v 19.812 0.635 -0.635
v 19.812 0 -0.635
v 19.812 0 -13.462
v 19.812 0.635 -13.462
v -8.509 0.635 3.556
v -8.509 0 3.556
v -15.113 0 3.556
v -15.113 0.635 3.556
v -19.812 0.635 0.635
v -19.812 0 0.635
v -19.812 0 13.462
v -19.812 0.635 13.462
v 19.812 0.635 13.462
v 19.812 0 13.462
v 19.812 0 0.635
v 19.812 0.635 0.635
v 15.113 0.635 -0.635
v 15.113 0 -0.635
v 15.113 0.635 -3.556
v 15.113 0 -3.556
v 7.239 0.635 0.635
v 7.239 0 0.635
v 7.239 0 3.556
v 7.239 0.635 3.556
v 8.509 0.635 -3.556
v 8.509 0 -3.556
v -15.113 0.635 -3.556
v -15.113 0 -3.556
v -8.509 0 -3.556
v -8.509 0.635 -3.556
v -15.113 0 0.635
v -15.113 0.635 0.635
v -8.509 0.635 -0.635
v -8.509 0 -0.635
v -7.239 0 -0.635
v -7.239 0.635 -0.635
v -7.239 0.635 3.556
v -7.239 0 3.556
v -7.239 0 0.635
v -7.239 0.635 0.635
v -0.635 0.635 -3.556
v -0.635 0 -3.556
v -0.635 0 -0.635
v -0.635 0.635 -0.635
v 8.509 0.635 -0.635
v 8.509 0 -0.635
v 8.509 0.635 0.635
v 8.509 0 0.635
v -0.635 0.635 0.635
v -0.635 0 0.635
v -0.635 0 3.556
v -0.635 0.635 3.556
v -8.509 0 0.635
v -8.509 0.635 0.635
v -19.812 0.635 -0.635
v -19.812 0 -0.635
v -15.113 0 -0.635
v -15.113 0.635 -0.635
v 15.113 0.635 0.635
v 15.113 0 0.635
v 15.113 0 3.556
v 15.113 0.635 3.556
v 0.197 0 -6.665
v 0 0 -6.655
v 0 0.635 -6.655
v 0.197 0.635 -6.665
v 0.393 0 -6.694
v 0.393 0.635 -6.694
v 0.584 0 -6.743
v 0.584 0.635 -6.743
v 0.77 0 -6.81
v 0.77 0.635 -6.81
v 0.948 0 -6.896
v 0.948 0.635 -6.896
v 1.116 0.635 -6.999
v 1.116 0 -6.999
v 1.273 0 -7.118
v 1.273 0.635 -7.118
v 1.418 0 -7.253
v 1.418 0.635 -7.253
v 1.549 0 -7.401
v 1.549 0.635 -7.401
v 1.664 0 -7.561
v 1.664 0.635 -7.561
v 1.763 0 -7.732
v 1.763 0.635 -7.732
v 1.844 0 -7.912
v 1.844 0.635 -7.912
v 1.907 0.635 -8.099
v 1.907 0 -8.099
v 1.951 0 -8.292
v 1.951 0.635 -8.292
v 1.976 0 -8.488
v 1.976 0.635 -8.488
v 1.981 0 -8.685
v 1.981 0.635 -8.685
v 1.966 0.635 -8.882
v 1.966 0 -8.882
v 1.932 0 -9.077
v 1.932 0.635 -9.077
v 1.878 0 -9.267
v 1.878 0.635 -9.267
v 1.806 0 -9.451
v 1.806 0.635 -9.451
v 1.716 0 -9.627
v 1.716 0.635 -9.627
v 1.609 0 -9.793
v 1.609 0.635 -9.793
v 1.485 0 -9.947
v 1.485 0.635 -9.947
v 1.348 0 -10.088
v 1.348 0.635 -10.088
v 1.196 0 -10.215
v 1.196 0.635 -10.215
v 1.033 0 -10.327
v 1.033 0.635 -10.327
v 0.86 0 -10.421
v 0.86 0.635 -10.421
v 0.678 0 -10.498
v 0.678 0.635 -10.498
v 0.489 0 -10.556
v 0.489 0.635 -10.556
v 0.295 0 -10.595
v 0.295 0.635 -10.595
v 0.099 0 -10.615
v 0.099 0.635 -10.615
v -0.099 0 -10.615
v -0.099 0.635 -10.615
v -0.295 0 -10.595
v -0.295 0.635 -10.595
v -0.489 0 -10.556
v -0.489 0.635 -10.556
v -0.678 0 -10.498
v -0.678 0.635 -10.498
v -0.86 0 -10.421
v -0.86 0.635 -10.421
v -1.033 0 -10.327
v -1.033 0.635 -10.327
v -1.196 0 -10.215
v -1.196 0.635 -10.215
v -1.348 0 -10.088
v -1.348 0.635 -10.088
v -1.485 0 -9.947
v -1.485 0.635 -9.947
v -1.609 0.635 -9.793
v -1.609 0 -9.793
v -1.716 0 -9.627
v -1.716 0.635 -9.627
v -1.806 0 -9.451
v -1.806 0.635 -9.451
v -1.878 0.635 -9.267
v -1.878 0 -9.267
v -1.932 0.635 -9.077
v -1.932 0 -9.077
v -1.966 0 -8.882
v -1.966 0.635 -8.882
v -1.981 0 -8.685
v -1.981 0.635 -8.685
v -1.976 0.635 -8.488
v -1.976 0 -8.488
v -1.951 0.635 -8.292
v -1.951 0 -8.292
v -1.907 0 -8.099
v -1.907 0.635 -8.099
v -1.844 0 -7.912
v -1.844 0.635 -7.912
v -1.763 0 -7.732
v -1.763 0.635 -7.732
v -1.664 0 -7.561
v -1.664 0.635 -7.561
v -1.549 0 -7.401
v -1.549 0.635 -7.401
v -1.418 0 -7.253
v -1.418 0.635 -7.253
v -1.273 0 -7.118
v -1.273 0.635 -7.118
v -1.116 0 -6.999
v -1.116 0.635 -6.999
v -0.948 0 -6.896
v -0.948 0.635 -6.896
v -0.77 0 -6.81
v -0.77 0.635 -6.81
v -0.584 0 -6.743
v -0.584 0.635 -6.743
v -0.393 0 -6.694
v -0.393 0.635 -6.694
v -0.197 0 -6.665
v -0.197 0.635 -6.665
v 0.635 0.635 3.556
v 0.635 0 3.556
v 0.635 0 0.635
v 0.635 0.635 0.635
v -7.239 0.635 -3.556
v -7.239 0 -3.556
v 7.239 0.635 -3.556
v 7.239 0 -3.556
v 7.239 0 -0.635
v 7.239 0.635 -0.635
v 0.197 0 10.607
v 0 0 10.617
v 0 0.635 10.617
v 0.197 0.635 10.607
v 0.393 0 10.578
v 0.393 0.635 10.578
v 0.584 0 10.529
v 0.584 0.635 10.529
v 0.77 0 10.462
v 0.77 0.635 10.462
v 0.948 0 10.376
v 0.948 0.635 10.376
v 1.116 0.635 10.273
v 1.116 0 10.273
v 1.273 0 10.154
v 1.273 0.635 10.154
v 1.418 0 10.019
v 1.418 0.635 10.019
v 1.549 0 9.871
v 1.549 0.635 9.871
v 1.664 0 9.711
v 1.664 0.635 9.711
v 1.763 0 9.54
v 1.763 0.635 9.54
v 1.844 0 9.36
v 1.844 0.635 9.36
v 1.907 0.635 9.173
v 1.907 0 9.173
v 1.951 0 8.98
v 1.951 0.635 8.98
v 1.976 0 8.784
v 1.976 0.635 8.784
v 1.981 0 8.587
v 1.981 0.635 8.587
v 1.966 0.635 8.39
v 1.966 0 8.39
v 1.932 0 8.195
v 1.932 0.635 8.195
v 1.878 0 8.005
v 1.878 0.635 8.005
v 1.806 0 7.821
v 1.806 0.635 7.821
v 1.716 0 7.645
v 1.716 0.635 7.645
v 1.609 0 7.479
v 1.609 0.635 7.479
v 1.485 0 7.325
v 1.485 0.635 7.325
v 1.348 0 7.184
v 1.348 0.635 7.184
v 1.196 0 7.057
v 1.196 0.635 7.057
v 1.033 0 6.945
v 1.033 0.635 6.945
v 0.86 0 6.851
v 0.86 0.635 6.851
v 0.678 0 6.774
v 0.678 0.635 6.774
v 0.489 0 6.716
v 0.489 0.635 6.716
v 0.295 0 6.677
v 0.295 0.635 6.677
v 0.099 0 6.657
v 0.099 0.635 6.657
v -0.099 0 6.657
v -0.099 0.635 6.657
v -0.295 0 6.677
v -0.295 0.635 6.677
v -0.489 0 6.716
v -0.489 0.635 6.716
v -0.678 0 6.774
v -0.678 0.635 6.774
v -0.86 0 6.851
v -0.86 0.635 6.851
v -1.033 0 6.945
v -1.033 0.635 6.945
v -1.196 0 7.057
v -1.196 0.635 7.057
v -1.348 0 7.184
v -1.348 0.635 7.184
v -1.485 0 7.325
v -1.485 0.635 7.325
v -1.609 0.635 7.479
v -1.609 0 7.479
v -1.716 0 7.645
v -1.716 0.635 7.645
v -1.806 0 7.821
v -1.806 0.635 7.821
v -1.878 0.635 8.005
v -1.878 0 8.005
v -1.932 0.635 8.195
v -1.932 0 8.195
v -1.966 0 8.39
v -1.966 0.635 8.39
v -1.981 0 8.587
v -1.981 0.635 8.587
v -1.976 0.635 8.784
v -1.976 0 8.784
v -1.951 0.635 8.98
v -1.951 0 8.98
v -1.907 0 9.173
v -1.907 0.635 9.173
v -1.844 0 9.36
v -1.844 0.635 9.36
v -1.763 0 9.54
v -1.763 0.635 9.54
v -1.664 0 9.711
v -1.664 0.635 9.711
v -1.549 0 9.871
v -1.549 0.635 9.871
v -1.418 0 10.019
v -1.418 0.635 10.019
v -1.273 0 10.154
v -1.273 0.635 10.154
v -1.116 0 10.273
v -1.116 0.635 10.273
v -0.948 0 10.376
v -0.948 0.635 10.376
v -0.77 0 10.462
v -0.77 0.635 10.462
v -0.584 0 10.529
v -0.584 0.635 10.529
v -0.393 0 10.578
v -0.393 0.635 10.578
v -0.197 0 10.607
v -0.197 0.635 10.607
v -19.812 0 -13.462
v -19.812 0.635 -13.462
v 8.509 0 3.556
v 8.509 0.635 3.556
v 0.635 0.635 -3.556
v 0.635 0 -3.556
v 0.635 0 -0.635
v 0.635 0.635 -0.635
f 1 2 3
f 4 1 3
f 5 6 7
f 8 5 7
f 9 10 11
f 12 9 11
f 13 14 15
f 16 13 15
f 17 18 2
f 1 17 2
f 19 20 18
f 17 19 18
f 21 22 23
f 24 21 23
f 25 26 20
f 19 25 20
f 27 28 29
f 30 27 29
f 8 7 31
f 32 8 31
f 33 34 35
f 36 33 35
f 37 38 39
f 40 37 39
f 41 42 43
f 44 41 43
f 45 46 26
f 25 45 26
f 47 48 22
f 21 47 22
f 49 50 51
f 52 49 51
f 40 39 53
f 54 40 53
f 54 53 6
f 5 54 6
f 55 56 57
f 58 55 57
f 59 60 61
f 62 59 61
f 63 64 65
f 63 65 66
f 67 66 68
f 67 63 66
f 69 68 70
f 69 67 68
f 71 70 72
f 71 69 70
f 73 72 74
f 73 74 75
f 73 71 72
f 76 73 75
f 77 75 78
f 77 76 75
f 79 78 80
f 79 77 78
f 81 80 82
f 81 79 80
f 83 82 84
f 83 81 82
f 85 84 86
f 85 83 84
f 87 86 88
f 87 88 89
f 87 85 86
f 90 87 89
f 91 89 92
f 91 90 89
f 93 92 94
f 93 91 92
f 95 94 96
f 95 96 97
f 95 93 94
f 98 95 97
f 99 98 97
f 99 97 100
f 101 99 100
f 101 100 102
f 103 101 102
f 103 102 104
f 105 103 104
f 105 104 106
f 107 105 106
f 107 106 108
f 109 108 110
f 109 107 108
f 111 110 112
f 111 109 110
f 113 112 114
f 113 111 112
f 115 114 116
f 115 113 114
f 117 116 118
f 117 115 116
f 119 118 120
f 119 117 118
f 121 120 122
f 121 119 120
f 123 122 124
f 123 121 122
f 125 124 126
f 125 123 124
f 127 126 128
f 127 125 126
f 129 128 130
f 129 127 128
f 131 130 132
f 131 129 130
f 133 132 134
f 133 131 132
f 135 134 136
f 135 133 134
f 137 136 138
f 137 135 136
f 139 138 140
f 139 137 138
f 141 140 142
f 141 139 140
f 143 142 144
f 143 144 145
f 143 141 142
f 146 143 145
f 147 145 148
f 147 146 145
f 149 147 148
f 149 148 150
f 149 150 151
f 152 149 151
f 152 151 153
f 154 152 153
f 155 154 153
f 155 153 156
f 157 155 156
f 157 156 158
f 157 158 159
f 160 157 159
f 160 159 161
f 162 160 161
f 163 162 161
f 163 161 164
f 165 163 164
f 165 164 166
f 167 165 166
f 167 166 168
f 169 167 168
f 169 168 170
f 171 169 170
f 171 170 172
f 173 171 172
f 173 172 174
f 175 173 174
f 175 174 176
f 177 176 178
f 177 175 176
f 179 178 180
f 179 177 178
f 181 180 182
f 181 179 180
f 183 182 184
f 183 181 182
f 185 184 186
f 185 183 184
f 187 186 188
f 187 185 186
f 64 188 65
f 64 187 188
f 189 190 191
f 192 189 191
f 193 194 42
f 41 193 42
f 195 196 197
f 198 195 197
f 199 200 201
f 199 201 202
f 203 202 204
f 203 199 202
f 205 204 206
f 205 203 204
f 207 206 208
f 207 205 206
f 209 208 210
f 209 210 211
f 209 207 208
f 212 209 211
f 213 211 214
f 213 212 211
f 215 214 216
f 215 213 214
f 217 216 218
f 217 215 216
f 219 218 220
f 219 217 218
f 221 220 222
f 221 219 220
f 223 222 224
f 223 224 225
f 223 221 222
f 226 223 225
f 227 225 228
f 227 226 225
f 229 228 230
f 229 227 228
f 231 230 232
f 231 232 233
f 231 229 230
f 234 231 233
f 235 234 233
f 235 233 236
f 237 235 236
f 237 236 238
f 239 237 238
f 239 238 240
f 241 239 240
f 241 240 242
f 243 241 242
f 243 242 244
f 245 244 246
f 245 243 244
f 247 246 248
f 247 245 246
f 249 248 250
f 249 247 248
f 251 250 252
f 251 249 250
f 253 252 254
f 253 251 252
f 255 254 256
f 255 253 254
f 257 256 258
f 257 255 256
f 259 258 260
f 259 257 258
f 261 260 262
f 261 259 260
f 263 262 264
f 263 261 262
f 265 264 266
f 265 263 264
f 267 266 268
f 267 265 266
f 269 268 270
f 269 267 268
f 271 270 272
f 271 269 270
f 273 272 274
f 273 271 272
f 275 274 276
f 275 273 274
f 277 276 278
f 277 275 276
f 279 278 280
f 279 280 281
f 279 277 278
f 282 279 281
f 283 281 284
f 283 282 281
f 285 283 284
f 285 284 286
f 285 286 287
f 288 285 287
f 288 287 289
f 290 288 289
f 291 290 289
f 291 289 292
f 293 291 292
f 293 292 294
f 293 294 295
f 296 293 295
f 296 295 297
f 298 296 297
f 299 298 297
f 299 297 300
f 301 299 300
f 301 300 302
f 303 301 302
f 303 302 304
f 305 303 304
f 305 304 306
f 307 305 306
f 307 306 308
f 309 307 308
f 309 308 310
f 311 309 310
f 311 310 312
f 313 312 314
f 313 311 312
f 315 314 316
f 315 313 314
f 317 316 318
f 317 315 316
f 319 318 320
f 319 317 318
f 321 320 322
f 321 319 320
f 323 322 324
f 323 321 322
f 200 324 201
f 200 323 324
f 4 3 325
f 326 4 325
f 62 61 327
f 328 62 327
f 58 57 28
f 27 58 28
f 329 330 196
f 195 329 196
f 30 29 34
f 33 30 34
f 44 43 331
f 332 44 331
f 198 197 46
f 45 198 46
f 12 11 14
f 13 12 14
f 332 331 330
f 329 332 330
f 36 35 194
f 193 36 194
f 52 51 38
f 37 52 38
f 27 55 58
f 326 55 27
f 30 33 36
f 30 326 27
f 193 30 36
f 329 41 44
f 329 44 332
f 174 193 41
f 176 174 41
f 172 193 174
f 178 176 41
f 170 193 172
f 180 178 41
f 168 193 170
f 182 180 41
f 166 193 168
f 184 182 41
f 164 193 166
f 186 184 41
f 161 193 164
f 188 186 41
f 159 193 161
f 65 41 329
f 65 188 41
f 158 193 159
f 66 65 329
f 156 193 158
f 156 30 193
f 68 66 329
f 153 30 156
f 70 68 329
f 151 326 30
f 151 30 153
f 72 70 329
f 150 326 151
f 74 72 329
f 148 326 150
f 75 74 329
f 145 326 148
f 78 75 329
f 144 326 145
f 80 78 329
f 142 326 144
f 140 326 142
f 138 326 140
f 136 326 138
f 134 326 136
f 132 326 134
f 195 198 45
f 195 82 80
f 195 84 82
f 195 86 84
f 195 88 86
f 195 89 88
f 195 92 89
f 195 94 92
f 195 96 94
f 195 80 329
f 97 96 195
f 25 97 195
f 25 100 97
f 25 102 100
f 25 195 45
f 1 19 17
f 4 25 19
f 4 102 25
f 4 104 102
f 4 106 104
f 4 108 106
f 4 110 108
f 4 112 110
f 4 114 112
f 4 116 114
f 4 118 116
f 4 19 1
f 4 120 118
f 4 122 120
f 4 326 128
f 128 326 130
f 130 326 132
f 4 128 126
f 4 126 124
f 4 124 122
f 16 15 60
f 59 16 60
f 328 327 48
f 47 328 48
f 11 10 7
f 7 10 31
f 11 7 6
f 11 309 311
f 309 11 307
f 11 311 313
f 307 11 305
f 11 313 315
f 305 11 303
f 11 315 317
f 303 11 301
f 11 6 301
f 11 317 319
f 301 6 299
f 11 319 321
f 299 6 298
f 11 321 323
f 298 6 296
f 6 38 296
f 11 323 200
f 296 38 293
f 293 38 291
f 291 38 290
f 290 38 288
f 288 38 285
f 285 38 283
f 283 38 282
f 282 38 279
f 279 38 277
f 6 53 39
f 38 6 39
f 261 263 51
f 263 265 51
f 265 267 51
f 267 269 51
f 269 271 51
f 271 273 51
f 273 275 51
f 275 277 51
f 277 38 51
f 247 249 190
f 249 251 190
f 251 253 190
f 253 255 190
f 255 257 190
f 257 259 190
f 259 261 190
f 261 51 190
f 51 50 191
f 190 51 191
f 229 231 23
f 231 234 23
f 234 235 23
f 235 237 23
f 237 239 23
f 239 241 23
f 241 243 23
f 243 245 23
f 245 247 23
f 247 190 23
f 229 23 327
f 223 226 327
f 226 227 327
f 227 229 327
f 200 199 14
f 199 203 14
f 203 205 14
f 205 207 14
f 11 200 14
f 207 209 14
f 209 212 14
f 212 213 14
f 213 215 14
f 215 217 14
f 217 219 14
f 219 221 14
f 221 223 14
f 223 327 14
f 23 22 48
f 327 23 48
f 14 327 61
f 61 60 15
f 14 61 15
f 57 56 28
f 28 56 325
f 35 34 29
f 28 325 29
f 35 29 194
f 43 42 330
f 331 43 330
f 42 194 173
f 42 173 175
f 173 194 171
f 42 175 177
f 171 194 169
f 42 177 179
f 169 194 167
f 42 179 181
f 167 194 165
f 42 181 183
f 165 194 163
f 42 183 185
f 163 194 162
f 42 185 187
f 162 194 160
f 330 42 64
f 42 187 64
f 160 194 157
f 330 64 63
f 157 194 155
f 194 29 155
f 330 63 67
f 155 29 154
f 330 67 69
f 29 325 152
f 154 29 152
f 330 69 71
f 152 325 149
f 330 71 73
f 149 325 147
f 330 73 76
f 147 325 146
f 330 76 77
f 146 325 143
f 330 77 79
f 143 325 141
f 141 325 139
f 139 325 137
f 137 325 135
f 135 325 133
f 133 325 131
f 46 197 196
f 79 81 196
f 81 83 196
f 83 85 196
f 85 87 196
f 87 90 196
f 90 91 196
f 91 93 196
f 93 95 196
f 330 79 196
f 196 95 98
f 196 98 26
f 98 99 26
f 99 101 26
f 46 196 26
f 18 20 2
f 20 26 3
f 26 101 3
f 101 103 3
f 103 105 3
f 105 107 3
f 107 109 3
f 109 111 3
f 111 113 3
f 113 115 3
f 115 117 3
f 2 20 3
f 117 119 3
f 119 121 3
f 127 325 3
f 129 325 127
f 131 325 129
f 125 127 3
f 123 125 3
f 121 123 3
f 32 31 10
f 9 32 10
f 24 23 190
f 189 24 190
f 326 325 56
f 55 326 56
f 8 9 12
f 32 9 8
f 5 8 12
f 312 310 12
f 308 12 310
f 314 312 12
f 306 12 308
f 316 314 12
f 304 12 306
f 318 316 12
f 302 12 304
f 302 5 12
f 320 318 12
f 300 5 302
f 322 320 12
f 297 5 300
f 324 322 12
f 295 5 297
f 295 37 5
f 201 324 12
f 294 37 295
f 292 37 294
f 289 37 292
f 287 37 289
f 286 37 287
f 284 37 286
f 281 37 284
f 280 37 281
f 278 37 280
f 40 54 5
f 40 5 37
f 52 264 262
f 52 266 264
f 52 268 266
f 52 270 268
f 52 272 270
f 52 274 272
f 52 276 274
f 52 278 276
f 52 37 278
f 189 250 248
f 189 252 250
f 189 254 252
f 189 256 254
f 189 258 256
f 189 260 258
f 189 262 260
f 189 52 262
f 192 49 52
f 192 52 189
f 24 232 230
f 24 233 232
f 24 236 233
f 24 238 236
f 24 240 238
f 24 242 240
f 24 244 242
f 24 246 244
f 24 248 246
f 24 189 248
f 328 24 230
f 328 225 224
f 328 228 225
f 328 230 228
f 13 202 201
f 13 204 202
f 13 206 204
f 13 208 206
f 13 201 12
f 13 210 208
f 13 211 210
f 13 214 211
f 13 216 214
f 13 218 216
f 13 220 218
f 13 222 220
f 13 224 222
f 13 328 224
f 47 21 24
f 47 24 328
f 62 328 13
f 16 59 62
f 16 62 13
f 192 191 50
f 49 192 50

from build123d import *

# Parameters (mm, degrees)
SKETCH2_R             = 1.9812
BOSS_EXTRUDE1_DEPTH   = 0.635
BOSS_EXTRUDE1_2_DEPTH = 0.635


with BuildPart() as part:
    # Sketch2 → Boss-Extrude1 (new body)
    with BuildSketch(Plane(origin=(0, 0, 0), x_dir=(1, 0, 0), z_dir=(0, 1, 0))):
        Polygon((-19.812, 13.462), (-19.812, 0.635), (-15.113, 0.635), (-15.113, 3.556), (-8.509, 3.556), (-8.509, 0.635), (-7.239, 0.635), (-7.239, 3.556), (-0.635, 3.556), (-0.635, 0.635), (0.635, 0.635), (0.635, 3.556), (7.239, 3.556), (7.239, 0.635), (8.509, 0.635), (8.509, 3.556), (15.113, 3.556), (15.113, 0.635), (19.812, 0.635), (19.812, 13.462), align=None)
        with Locations(Location((0, 8.636, 0), (0, 0, 270))):
            Circle(SKETCH2_R, mode=Mode.SUBTRACT)
    extrude(amount=BOSS_EXTRUDE1_DEPTH)


with BuildPart() as body_2:
    # Sketch2 → Boss-Extrude1 2 (new body)
    with BuildSketch(Plane(origin=(0, 0, 0), x_dir=(1, 0, 0), z_dir=(0, 1, 0))):
        Polygon((-15.113, -0.635), (-19.812, -0.635), (-19.812, -13.462), (19.812, -13.462), (19.812, -0.635), (15.113, -0.635), (15.113, -3.556), (8.509, -3.556), (8.509, -0.635), (7.239, -0.635), (7.239, -3.556), (0.635, -3.556), (0.635, -0.635), (-0.635, -0.635), (-0.635, -3.556), (-7.239, -3.556), (-7.239, -0.635), (-8.509, -0.635), (-8.509, -3.556), (-15.113, -3.556), align=None)
        with Locations(Location((0, -8.636, 0), (0, 0, 270))):
            Circle(SKETCH2_R, mode=Mode.SUBTRACT)
    extrude(amount=BOSS_EXTRUDE1_2_DEPTH)


solid = Compound([part.part, body_2.part])
